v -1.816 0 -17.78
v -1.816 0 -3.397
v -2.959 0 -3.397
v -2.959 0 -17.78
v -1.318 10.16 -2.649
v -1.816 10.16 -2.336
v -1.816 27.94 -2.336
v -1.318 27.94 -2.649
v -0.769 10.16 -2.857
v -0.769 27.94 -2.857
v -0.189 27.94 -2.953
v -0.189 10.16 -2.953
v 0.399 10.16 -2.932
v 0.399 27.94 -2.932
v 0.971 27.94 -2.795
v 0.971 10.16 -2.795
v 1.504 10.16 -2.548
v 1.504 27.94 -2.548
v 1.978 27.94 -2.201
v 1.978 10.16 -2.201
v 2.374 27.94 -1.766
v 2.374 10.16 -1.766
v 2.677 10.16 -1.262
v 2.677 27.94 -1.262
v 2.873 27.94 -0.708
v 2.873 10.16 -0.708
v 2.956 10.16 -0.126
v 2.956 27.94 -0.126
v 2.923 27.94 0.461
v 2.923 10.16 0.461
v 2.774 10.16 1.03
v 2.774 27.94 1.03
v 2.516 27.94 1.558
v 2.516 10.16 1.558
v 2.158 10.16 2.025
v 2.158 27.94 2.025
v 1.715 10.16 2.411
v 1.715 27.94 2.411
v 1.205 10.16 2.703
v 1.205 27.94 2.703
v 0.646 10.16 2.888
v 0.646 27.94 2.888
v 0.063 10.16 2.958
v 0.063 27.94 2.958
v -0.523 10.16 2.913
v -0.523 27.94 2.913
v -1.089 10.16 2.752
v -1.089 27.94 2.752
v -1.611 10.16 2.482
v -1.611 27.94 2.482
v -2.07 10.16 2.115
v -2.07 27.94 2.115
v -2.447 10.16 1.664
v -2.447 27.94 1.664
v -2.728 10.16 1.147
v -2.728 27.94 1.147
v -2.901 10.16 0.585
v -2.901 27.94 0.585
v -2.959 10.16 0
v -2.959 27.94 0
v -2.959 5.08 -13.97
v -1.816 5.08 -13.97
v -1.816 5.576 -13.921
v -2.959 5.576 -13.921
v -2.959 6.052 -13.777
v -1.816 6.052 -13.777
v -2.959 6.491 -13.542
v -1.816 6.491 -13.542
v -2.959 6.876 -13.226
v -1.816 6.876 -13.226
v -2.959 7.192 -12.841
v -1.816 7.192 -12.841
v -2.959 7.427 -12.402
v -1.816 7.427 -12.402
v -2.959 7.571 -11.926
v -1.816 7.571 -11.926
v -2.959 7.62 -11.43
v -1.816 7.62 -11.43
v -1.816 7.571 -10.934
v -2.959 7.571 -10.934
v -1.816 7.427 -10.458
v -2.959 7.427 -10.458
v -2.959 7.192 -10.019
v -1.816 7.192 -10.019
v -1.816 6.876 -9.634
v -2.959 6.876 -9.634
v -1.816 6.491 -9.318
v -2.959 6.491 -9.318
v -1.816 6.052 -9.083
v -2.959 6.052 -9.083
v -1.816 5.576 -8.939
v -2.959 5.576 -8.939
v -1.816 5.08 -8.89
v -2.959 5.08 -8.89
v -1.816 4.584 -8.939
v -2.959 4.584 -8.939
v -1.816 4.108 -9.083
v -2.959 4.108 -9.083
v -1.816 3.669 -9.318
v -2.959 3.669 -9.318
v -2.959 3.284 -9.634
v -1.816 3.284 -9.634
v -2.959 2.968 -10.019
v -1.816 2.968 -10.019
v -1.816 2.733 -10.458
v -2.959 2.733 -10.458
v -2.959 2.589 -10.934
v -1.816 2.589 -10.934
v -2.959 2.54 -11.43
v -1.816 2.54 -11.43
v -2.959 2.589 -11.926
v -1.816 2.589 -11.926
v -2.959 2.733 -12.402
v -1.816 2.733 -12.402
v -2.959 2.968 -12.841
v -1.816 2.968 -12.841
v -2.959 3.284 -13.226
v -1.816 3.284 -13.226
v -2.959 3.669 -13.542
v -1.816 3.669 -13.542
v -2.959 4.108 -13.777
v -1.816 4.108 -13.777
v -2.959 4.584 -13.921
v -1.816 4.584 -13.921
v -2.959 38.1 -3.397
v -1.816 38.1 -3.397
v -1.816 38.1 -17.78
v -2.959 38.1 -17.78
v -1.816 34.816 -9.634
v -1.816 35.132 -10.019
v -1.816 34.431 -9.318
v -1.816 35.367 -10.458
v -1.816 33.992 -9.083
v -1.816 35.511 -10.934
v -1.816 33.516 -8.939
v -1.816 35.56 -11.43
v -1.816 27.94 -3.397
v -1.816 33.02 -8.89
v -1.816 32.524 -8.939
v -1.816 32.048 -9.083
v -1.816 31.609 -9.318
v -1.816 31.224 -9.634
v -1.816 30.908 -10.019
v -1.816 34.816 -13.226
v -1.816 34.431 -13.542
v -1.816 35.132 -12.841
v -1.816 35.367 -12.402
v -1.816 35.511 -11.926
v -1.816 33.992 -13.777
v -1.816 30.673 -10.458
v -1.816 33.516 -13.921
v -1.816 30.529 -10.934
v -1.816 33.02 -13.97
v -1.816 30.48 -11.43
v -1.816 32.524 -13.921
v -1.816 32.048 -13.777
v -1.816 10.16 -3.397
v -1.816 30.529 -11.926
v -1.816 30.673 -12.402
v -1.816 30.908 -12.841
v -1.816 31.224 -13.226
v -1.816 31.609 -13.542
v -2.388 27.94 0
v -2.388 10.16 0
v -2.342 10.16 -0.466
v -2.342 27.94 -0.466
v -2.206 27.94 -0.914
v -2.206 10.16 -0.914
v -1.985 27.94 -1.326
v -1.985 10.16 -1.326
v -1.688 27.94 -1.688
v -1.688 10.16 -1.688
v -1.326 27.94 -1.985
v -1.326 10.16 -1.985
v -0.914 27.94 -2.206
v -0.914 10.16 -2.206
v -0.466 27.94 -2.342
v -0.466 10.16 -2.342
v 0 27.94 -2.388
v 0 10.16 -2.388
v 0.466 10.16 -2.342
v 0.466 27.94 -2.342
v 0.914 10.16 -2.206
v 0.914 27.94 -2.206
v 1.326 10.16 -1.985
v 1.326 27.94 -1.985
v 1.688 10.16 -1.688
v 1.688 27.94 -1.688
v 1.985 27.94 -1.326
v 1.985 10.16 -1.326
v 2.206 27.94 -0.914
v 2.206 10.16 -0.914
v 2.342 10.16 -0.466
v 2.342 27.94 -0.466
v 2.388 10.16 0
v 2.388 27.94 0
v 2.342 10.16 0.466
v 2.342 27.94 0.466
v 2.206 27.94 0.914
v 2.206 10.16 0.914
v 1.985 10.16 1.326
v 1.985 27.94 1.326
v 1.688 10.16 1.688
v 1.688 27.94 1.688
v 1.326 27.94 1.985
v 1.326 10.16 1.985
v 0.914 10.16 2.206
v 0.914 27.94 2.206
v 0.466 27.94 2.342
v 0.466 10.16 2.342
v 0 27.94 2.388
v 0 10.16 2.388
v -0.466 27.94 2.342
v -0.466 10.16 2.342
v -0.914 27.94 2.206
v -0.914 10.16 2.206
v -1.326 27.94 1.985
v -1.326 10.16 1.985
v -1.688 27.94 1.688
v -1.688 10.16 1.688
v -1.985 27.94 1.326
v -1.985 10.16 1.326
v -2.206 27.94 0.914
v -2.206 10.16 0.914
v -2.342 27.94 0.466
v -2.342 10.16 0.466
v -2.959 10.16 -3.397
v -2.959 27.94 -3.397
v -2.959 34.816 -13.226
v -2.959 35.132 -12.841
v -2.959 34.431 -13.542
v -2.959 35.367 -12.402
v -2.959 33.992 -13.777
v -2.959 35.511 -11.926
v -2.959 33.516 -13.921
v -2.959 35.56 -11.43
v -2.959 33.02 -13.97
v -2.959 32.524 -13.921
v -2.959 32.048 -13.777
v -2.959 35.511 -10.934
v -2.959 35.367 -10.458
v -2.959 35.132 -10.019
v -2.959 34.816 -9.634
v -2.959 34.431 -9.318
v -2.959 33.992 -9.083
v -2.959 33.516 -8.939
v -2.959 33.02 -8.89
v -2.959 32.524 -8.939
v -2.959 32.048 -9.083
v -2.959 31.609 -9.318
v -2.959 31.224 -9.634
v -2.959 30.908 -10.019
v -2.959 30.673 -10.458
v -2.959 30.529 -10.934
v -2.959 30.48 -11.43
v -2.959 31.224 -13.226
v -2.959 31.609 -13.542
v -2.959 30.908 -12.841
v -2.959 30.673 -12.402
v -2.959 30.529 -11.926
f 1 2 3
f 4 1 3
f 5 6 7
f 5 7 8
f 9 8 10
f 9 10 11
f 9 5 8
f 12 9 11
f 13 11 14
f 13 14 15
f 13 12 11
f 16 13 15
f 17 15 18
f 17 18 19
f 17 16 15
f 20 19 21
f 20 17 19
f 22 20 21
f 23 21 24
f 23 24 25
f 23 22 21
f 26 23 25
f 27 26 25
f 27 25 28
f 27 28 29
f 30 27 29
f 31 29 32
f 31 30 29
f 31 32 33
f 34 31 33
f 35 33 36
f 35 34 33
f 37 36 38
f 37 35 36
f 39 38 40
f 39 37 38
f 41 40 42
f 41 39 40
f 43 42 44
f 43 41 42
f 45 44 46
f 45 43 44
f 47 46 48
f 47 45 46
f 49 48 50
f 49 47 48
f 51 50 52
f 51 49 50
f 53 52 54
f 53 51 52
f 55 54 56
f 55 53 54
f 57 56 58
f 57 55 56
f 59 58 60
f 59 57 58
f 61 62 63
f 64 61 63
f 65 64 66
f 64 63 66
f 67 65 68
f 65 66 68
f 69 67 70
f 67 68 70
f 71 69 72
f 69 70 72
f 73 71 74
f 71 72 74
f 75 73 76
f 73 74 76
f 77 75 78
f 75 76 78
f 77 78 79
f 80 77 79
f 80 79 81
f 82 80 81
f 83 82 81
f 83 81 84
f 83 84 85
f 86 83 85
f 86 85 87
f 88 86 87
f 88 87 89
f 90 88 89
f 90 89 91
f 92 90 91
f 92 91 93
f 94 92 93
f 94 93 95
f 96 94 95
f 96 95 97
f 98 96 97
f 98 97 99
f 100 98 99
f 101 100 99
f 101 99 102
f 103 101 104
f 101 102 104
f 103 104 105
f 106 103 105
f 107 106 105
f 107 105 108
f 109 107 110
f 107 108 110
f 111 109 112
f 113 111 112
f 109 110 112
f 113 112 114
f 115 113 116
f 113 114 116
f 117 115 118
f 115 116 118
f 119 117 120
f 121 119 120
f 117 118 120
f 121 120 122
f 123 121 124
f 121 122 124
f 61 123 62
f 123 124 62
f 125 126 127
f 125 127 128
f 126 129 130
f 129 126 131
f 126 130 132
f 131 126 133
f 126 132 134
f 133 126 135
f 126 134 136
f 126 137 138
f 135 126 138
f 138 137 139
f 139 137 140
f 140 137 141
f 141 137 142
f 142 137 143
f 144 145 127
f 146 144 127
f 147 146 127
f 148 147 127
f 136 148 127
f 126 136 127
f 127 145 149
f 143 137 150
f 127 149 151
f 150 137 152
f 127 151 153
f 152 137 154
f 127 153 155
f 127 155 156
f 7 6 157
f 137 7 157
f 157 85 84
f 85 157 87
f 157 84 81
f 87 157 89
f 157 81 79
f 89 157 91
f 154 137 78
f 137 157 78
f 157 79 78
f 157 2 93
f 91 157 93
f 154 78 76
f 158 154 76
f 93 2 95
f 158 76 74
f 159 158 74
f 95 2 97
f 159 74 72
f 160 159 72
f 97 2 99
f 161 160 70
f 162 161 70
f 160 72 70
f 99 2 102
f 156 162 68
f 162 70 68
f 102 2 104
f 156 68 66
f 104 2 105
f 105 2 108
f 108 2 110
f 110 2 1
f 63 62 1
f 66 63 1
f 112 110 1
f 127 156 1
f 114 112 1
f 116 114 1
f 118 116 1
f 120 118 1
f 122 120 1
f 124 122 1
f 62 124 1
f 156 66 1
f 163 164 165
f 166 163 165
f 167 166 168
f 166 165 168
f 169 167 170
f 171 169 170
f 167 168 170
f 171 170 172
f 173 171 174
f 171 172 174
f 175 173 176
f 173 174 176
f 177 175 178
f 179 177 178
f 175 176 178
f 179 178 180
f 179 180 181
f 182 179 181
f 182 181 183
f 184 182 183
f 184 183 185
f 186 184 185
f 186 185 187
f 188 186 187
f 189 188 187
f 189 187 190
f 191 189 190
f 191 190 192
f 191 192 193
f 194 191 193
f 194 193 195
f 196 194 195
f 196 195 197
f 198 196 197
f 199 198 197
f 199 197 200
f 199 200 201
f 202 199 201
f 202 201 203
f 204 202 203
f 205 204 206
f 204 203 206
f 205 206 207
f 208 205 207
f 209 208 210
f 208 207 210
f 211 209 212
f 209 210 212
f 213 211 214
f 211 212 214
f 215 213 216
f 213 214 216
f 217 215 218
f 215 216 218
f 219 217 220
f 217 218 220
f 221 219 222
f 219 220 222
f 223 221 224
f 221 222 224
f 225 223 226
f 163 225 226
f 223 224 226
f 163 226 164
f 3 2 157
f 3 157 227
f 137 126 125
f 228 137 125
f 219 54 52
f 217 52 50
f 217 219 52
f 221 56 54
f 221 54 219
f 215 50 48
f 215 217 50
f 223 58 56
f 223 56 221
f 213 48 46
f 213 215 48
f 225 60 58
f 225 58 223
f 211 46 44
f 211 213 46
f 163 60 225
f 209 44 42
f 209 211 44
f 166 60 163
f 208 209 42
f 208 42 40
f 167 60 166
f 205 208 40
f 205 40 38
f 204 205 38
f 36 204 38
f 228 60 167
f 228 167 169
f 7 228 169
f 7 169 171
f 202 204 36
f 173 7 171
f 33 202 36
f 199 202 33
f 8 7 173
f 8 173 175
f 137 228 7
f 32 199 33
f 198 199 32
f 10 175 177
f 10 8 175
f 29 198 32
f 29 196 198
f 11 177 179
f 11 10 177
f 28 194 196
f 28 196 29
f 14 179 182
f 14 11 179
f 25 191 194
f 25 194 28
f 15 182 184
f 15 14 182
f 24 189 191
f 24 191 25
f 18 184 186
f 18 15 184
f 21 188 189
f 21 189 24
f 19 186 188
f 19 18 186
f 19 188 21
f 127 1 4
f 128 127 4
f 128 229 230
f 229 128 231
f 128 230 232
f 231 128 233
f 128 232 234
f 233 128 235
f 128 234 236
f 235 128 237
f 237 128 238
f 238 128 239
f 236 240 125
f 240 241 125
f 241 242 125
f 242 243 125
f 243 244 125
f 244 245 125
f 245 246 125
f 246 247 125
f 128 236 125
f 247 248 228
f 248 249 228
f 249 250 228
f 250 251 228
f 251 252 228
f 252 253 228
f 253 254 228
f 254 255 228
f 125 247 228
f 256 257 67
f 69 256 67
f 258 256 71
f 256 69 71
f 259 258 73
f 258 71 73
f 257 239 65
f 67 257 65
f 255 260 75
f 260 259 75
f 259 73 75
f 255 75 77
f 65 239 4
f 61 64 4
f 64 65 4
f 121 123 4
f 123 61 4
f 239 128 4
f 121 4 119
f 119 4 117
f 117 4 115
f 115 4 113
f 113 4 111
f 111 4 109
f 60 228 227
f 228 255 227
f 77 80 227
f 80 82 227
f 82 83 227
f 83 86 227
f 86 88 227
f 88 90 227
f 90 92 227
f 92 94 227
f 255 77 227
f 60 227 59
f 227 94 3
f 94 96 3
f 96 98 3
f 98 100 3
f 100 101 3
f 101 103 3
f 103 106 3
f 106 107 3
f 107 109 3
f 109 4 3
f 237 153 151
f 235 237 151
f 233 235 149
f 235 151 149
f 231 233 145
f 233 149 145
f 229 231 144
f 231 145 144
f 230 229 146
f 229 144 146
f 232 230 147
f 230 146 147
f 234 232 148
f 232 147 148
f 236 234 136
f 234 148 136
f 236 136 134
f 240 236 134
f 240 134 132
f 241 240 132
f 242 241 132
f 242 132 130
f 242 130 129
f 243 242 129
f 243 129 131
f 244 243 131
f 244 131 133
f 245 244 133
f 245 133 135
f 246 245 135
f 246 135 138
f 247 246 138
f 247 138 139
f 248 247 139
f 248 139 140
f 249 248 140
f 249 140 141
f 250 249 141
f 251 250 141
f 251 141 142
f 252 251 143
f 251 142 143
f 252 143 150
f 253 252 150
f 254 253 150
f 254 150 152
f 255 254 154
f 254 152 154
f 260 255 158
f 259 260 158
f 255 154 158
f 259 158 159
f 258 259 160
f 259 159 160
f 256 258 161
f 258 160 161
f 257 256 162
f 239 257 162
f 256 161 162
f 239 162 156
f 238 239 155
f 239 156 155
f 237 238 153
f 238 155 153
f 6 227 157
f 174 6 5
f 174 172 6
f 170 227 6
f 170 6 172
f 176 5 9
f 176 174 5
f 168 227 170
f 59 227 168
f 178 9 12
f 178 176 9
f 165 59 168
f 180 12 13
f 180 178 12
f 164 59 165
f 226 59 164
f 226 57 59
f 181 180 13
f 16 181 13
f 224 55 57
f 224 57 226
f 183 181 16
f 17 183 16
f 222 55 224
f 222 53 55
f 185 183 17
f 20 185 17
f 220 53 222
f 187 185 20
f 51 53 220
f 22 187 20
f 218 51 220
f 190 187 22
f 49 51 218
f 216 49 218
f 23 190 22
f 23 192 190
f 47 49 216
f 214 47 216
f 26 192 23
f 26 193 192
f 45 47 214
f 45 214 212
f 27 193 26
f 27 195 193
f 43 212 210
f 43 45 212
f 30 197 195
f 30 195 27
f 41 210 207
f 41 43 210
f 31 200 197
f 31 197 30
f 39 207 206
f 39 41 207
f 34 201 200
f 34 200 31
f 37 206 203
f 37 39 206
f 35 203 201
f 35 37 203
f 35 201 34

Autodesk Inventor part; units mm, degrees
ref_plane "YZ Plane" through (0, 0, 0) normal (1, 0, 0) x (0, 1, 0)
ref_plane "XZ Plane" through (0, 0, 0) normal (0, 1, 0) x (-1, 0, 0)
ref_plane "XY Plane" through (0, 0, 0) normal (0, 0, 1) x (1, 0, 0)
sketch "Sketch1" plane through (0, 0, 0) normal (0, 1, 0) x (-1, 0, 0)
  circle A0 centre (0, 0) radius 2.3876
  arc A1 (2.9591, 0) -> (1.8161, -2.3362) centre (0, 0) ccw
  line L0 (2.9591, 0) -> (2.3876, 0)
  line L1 (1.8161, -2.3362) -> (1.8161, -17.78)
  line L2 (1.8161, -17.78) -> (2.9591, -17.78)
  line L3 (2.9591, -17.78) -> (2.9591, 0)
  dimension "d0" = 4.7752
  dimension "d1" = 5.9182
  dimension "d2" = 17.78
  dimension "d3" = 1.143
extrude "Extrusion1" add sketch "Sketch1" along normal blind 38.1
sketch "Sketch2" plane through (0, 38.1, 0) normal (0, 1, 0) x (1, 0, 0)
  line L0 (-4.1424, -3.452) -> (4.5842, -3.452)
  line L1 (4.5842, -3.452) -> (4.5842, 3.3967)
  line L2 (4.5842, 3.3967) -> (-4.1424, 3.3967)
  line L3 (-4.1424, 3.3967) -> (-4.1424, -3.452)
  point P0 (0, 0)
  dimension "d6" = 8.7266
  dimension "d7" = 6.8487
  dimension "d8" = 4.5842
  dimension "d9" = 3.3967
sketch "Sketch3" plane through (0, 0, 0) normal (0, -1, 0) x (1, 0, 0)
  line L0 (-4.1424, -3.3967) -> (-4.1424, 3.452) projected
  line L1 (-4.1424, 3.452) -> (4.5842, 3.452) projected
  line L2 (4.5842, 3.452) -> (4.5842, -3.3967) projected
  line L3 (4.5842, -3.3967) -> (-4.1424, -3.3967) projected
  point P0 (0, 0)
extrude "Extrusion2" cut sketch "Sketch3" against normal blind 10.16
extrude "Extrusion3" cut sketch "Sketch2" against normal blind 10.16
sketch "Sketch4" plane through (-1.8161, 0, -3.7778) normal (1, 0, 0) x (0, 0, -1)
  circle A0 centre (7.6522, 5.08) radius 2.54
  circle A1 centre (7.6522, 33.02) radius 2.54
  line L0 (14.0022, 0) -> (14.0022, 38.1)
  line L1 (0, 0) -> (14.0022, 0)
  line L2 (0, 38.1) -> (14.0022, 38.1)
  line L3 (14.0022, 0) -> (14.0022, 38.1) projected
  line L4 (-0.381, 38.1) -> (14.0022, 38.1) projected
  line L5 (-0.381, 0) -> (14.0022, 0) projected
  point P0 (-2.3362, 0)
  dimension "d17" = 6.35
  dimension "d16" = 5.08
  dimension "d15" = 5.08
  dimension "d14" = 5.08
  dimension "d21" = 14.0022
  dimension "d22" = 14.0022
  dimension "d23" = 16.3385
  dimension "d24" = 38.1
extrude "Extrusion4" cut sketch "Sketch4" against normal up to next
equation "\"d14\" = d16"
properties part number "Hinge Wall 1"
